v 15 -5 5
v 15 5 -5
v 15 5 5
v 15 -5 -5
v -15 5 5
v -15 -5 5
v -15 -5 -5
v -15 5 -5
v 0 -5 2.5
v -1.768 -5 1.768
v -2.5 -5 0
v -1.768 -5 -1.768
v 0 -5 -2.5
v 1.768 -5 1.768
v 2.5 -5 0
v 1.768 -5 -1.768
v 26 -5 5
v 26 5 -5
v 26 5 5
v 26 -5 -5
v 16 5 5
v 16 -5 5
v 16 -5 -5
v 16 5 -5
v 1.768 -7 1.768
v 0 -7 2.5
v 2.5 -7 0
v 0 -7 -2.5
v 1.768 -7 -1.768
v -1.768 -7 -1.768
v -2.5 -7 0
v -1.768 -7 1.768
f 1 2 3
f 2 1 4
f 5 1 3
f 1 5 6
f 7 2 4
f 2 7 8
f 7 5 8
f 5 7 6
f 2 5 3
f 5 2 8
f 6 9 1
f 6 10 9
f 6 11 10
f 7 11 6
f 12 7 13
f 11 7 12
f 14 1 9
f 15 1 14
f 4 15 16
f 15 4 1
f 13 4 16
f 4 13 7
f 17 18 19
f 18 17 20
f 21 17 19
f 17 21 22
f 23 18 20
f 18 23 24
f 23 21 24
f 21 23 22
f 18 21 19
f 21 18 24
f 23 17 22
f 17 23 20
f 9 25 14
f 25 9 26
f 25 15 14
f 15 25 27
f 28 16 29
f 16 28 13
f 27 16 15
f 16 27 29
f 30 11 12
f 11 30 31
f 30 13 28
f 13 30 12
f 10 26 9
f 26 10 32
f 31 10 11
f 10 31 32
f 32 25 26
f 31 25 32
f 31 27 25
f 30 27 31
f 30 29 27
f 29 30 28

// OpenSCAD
cube([30, 10, 10], center=true);
translate([21, 0, 0]) cube([10, 10, 10], center=true);
rotate([90, 0, 0]) 
    translate([0, 0, 5])
    cylinder(h=2, r=2.5);
